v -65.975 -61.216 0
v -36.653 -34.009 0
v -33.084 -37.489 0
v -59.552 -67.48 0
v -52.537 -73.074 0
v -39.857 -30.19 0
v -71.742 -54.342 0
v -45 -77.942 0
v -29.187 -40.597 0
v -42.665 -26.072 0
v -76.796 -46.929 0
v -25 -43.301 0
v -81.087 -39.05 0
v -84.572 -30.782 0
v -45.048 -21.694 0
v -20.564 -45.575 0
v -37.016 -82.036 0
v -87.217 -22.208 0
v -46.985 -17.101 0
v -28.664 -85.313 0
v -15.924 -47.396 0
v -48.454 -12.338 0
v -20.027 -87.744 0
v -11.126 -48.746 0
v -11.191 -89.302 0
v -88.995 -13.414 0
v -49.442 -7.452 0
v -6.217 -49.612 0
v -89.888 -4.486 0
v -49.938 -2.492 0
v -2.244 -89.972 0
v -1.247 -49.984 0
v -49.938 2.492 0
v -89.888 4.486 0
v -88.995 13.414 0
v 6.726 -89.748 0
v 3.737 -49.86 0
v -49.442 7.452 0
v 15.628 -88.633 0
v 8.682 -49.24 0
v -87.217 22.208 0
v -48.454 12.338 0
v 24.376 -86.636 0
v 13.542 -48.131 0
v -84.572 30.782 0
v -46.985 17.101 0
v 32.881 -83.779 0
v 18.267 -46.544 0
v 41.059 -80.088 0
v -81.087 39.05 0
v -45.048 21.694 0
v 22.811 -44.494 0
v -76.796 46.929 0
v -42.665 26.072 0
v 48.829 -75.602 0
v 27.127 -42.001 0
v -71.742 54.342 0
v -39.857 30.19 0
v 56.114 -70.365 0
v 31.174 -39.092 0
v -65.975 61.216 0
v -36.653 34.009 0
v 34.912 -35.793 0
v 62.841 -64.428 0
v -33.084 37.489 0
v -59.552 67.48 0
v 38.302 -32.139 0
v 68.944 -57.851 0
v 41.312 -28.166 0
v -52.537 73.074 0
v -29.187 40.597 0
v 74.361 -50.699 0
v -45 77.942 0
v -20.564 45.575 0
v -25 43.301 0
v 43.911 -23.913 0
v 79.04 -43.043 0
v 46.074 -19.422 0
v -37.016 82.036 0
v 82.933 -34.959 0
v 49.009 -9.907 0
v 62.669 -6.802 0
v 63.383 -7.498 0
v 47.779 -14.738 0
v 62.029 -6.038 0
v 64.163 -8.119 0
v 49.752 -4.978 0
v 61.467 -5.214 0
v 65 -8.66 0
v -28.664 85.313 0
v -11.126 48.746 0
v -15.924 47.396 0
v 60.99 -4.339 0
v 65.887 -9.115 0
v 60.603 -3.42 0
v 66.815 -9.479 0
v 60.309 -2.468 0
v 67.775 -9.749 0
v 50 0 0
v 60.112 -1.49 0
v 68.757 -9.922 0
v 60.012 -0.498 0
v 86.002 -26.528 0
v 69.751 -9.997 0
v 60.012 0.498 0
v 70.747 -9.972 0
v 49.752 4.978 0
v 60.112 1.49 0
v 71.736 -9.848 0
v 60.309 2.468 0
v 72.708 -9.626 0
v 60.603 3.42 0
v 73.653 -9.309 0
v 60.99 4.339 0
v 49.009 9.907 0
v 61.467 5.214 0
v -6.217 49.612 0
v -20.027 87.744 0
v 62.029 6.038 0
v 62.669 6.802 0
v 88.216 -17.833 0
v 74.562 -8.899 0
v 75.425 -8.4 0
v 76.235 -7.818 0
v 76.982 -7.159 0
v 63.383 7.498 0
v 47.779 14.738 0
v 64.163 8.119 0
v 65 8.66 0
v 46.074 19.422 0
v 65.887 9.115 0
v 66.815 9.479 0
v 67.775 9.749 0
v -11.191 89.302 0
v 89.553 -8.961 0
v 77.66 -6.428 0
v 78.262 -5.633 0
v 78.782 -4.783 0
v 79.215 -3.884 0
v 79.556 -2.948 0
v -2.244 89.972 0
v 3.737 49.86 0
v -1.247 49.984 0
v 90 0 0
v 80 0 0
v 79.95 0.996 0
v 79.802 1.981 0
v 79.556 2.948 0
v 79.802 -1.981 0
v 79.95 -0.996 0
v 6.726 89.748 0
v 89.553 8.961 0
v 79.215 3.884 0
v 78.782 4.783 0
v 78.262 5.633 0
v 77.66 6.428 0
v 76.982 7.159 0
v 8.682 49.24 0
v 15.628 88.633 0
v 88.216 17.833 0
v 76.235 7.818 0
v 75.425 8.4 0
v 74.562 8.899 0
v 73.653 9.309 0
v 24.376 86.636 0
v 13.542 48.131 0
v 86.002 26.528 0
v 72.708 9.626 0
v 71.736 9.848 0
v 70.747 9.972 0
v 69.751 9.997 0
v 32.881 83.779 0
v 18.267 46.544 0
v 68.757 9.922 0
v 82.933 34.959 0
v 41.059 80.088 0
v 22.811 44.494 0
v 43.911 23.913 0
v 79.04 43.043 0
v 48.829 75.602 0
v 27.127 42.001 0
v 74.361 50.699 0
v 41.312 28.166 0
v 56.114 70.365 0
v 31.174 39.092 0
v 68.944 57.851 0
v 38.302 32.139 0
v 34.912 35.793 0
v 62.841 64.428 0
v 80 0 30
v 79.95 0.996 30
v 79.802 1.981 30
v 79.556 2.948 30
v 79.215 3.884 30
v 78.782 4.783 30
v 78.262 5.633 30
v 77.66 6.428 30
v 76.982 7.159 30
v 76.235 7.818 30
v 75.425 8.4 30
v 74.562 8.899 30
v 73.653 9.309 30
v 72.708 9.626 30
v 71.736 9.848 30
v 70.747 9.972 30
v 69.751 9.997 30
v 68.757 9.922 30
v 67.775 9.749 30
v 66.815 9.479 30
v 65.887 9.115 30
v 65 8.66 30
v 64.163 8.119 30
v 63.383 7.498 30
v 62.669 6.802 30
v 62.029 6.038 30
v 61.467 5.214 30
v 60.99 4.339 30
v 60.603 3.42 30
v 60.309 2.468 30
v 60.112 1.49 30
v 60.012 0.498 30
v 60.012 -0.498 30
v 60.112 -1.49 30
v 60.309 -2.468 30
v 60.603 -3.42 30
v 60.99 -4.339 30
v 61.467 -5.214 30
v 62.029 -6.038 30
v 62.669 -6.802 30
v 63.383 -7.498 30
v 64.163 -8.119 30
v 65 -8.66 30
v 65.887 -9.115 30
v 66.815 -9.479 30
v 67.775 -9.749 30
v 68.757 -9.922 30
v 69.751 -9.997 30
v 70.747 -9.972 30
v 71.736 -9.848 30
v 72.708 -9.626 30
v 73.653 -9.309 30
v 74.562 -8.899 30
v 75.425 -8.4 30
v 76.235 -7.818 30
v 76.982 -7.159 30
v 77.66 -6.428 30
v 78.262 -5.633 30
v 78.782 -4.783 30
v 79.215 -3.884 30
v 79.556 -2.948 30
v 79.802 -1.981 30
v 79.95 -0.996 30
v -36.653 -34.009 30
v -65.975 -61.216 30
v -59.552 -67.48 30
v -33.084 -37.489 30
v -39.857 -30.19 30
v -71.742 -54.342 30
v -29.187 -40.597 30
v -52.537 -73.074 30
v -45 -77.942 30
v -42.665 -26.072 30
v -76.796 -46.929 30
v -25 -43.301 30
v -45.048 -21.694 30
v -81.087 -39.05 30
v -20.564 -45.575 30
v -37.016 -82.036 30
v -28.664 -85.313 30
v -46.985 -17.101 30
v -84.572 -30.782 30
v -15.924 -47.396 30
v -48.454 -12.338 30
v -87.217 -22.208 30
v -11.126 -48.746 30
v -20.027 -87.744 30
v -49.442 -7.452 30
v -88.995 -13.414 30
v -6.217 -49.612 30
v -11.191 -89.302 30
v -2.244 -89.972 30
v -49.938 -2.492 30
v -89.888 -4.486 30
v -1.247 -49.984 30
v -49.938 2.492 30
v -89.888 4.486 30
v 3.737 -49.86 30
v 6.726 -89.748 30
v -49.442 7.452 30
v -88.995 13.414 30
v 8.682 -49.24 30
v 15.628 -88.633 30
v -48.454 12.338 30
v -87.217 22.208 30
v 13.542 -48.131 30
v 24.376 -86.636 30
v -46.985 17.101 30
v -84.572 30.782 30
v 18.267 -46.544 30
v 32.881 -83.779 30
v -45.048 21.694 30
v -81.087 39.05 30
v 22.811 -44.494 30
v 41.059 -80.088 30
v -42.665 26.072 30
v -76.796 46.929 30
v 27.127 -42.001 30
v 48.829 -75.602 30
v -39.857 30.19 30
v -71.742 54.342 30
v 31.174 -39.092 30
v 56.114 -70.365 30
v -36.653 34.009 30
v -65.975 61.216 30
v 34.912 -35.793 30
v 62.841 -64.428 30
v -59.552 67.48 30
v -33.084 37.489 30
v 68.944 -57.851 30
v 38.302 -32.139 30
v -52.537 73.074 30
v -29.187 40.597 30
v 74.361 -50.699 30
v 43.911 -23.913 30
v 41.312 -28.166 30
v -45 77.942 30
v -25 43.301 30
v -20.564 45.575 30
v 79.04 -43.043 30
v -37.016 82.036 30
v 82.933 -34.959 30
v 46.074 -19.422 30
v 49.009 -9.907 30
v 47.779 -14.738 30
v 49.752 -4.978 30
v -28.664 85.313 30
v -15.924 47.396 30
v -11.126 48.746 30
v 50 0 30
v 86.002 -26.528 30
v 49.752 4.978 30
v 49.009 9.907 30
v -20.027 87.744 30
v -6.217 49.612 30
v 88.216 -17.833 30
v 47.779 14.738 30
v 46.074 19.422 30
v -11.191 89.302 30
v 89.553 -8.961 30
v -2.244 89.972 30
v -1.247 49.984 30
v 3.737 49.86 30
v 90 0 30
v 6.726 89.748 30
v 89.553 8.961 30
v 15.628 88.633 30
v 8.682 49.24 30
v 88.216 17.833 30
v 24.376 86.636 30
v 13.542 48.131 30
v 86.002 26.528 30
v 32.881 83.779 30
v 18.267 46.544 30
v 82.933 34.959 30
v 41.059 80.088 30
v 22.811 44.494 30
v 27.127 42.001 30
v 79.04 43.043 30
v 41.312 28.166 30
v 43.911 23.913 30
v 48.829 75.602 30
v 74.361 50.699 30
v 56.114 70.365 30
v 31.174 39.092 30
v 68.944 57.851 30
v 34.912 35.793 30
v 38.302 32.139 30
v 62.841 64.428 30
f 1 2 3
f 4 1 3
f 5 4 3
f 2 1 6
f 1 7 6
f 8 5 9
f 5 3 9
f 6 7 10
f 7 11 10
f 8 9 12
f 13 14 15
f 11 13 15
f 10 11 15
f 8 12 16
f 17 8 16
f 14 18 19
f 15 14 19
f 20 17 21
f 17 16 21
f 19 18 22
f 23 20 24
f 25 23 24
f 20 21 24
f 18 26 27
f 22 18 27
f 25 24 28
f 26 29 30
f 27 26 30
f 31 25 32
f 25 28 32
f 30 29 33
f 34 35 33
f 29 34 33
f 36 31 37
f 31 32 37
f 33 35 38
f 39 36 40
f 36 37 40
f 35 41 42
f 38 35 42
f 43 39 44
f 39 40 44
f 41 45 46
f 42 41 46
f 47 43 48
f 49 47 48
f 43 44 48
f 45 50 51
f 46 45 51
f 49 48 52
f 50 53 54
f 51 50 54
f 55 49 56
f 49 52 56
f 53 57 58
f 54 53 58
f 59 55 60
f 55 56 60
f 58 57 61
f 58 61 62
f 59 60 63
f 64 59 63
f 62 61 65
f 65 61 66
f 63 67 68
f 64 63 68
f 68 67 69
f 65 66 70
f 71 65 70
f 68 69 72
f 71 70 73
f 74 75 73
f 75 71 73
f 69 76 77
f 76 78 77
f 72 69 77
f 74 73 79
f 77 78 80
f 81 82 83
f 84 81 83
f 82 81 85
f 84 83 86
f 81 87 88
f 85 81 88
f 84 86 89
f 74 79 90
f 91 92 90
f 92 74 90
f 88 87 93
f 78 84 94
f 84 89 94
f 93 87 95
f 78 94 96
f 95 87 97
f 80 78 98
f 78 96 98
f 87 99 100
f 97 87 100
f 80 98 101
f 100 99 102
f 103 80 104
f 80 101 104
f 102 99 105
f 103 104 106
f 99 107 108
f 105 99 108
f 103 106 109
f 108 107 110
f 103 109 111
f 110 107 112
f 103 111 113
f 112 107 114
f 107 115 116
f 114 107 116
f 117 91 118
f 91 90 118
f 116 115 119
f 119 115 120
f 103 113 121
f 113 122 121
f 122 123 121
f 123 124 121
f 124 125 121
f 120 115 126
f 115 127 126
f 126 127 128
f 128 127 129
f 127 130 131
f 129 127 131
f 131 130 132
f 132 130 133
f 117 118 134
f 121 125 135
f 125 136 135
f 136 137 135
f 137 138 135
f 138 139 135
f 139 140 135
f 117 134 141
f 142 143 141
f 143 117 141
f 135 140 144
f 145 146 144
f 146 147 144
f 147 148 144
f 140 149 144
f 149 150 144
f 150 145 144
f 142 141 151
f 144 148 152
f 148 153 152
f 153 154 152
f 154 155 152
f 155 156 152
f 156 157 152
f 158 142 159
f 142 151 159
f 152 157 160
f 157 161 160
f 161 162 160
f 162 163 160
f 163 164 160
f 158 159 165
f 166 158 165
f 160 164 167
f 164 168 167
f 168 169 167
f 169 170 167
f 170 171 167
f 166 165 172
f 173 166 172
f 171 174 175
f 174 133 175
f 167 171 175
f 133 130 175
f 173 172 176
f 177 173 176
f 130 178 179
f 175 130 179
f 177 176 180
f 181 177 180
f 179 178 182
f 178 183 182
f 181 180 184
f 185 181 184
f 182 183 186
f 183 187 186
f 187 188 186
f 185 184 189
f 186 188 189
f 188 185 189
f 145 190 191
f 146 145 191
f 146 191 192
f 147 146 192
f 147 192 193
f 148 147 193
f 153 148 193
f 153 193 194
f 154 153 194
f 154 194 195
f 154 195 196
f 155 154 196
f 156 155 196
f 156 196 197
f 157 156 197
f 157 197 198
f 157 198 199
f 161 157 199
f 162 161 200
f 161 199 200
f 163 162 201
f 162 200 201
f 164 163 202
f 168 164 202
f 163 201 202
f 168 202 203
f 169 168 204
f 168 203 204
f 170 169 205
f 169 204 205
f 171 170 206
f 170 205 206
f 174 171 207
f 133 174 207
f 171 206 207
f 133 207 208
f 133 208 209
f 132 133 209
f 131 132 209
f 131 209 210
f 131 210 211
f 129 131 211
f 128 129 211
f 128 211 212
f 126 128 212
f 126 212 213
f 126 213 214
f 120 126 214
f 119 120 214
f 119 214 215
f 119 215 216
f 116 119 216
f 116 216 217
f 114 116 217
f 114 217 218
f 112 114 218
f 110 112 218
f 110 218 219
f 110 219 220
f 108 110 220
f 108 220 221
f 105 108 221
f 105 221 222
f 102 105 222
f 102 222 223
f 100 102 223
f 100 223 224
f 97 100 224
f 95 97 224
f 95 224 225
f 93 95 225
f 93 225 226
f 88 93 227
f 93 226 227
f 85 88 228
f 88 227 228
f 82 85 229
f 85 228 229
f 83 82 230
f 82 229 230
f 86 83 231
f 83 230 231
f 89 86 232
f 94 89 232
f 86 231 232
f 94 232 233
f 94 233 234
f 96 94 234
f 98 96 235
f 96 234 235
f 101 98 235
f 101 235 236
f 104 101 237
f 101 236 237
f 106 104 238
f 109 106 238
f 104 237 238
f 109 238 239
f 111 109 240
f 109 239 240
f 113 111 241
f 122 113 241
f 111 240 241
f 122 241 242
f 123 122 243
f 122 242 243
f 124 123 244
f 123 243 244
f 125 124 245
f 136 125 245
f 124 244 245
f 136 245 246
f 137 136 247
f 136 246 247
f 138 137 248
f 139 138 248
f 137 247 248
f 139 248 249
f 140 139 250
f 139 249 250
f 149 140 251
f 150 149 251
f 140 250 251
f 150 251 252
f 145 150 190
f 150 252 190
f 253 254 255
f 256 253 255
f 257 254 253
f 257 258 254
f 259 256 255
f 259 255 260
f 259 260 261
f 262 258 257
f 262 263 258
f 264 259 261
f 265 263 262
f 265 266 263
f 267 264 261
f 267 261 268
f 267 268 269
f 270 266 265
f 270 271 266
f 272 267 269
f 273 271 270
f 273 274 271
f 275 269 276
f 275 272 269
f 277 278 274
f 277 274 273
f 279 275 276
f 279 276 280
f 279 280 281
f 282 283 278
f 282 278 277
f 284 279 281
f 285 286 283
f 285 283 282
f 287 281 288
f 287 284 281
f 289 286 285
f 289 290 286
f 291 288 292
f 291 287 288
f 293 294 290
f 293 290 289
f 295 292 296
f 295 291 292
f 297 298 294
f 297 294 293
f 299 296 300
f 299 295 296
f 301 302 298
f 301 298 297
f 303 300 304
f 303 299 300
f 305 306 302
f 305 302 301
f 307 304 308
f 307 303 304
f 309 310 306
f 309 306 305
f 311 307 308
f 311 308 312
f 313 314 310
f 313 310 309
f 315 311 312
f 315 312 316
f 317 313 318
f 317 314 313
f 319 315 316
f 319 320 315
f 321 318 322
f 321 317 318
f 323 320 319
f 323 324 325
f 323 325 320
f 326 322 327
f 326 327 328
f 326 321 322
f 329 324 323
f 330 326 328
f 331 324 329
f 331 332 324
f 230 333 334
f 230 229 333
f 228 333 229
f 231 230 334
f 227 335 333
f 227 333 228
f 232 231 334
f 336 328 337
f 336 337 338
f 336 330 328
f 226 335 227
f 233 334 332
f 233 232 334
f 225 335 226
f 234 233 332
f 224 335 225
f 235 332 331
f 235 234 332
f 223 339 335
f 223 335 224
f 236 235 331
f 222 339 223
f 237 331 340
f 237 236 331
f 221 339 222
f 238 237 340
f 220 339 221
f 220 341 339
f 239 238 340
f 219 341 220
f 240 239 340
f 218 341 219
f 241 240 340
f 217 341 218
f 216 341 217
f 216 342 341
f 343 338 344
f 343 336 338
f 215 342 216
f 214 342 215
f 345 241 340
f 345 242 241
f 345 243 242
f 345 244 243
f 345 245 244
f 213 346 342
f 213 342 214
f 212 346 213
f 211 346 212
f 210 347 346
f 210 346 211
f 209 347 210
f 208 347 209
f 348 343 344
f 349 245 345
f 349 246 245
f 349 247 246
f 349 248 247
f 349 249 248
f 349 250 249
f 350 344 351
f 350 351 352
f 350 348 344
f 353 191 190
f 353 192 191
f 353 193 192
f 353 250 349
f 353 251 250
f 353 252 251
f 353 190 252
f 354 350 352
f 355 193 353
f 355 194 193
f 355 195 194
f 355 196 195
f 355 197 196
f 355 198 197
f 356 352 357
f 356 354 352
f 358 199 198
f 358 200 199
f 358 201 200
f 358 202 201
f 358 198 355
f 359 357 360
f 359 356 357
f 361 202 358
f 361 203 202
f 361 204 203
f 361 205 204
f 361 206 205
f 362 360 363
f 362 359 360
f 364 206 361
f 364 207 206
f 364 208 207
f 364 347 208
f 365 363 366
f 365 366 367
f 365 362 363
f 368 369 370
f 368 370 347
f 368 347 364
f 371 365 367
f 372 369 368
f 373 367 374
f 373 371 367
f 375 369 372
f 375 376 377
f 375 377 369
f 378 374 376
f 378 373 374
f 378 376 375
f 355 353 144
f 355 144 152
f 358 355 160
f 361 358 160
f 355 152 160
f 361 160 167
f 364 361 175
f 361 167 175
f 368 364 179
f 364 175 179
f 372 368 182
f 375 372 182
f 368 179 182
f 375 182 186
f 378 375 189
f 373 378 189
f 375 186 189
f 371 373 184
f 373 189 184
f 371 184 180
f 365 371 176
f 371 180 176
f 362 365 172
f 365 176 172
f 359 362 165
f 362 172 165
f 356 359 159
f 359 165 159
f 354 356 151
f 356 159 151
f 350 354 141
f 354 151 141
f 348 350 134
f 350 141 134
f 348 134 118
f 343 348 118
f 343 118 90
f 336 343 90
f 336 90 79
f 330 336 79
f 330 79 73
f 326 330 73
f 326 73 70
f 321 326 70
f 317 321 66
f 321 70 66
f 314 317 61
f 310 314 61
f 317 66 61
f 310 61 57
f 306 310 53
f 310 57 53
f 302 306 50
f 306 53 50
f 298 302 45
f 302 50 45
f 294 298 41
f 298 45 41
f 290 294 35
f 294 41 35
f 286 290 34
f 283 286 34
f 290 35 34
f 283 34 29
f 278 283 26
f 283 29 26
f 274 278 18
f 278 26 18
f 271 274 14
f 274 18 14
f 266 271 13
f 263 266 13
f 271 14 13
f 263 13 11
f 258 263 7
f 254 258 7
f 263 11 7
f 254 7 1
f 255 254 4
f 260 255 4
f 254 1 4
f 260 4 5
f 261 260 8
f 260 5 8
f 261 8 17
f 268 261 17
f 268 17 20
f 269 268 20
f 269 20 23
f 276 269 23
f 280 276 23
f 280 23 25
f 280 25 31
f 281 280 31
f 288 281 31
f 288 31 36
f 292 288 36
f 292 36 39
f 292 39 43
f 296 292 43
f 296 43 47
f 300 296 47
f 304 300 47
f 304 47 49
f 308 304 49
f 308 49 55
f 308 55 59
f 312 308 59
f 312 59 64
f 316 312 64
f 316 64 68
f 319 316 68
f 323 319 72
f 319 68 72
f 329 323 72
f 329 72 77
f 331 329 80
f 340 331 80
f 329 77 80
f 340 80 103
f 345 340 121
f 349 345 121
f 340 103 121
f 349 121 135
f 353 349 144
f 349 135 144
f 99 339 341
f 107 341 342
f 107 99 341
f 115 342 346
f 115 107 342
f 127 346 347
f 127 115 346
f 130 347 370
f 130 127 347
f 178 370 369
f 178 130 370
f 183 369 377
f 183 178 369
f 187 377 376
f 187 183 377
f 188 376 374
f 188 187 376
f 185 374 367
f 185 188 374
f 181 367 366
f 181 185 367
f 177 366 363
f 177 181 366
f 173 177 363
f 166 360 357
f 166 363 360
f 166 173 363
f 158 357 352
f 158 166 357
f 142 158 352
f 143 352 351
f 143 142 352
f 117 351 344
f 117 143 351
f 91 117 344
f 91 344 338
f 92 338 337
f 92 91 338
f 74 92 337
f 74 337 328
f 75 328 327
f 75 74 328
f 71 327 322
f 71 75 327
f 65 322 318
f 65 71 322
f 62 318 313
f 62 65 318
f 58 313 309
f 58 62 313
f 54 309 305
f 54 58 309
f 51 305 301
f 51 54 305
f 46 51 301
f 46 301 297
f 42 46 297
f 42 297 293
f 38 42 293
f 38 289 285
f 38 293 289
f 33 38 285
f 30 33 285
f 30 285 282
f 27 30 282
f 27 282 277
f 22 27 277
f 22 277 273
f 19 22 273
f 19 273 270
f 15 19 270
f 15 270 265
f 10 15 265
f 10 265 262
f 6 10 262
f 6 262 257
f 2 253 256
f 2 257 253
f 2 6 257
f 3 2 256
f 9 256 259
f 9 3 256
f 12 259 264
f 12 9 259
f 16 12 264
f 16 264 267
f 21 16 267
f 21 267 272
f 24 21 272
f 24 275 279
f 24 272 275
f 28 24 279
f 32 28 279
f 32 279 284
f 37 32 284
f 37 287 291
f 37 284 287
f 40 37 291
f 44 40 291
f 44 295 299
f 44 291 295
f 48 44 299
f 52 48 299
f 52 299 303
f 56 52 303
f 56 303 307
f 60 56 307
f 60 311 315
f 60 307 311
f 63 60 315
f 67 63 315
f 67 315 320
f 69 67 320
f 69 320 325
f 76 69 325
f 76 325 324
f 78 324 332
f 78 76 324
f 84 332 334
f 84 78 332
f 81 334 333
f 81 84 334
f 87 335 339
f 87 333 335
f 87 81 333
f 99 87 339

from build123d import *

# Parameters (mm, degrees)
SKETCH1_R           = 90
BOSS_EXTRUDE1_DEPTH = 30
SKETCH2_R           = 50
CUT_EXTRUDE1_DEPTH  = 70
SKETCH3_R           = 10
CUT_EXTRUDE2_DEPTH  = 70


with BuildPart() as part:
    # Sketch1 → Boss-Extrude1 (new body)
    with BuildSketch(Plane.XY):
        Circle(SKETCH1_R)
    extrude(amount=BOSS_EXTRUDE1_DEPTH)

    # Sketch2 → Cut-Extrude1 (cut)
    with BuildSketch(Plane.XY):
        Circle(SKETCH2_R)
    extrude(amount=CUT_EXTRUDE1_DEPTH, mode=Mode.SUBTRACT)

    # Sketch3 → Cut-Extrude2 (cut)
    with BuildSketch(Plane.XY.offset(30)):
        with Locations((70, 0)):
            Circle(SKETCH3_R)
    extrude(amount=-CUT_EXTRUDE2_DEPTH, mode=Mode.SUBTRACT)


solid = part.part
